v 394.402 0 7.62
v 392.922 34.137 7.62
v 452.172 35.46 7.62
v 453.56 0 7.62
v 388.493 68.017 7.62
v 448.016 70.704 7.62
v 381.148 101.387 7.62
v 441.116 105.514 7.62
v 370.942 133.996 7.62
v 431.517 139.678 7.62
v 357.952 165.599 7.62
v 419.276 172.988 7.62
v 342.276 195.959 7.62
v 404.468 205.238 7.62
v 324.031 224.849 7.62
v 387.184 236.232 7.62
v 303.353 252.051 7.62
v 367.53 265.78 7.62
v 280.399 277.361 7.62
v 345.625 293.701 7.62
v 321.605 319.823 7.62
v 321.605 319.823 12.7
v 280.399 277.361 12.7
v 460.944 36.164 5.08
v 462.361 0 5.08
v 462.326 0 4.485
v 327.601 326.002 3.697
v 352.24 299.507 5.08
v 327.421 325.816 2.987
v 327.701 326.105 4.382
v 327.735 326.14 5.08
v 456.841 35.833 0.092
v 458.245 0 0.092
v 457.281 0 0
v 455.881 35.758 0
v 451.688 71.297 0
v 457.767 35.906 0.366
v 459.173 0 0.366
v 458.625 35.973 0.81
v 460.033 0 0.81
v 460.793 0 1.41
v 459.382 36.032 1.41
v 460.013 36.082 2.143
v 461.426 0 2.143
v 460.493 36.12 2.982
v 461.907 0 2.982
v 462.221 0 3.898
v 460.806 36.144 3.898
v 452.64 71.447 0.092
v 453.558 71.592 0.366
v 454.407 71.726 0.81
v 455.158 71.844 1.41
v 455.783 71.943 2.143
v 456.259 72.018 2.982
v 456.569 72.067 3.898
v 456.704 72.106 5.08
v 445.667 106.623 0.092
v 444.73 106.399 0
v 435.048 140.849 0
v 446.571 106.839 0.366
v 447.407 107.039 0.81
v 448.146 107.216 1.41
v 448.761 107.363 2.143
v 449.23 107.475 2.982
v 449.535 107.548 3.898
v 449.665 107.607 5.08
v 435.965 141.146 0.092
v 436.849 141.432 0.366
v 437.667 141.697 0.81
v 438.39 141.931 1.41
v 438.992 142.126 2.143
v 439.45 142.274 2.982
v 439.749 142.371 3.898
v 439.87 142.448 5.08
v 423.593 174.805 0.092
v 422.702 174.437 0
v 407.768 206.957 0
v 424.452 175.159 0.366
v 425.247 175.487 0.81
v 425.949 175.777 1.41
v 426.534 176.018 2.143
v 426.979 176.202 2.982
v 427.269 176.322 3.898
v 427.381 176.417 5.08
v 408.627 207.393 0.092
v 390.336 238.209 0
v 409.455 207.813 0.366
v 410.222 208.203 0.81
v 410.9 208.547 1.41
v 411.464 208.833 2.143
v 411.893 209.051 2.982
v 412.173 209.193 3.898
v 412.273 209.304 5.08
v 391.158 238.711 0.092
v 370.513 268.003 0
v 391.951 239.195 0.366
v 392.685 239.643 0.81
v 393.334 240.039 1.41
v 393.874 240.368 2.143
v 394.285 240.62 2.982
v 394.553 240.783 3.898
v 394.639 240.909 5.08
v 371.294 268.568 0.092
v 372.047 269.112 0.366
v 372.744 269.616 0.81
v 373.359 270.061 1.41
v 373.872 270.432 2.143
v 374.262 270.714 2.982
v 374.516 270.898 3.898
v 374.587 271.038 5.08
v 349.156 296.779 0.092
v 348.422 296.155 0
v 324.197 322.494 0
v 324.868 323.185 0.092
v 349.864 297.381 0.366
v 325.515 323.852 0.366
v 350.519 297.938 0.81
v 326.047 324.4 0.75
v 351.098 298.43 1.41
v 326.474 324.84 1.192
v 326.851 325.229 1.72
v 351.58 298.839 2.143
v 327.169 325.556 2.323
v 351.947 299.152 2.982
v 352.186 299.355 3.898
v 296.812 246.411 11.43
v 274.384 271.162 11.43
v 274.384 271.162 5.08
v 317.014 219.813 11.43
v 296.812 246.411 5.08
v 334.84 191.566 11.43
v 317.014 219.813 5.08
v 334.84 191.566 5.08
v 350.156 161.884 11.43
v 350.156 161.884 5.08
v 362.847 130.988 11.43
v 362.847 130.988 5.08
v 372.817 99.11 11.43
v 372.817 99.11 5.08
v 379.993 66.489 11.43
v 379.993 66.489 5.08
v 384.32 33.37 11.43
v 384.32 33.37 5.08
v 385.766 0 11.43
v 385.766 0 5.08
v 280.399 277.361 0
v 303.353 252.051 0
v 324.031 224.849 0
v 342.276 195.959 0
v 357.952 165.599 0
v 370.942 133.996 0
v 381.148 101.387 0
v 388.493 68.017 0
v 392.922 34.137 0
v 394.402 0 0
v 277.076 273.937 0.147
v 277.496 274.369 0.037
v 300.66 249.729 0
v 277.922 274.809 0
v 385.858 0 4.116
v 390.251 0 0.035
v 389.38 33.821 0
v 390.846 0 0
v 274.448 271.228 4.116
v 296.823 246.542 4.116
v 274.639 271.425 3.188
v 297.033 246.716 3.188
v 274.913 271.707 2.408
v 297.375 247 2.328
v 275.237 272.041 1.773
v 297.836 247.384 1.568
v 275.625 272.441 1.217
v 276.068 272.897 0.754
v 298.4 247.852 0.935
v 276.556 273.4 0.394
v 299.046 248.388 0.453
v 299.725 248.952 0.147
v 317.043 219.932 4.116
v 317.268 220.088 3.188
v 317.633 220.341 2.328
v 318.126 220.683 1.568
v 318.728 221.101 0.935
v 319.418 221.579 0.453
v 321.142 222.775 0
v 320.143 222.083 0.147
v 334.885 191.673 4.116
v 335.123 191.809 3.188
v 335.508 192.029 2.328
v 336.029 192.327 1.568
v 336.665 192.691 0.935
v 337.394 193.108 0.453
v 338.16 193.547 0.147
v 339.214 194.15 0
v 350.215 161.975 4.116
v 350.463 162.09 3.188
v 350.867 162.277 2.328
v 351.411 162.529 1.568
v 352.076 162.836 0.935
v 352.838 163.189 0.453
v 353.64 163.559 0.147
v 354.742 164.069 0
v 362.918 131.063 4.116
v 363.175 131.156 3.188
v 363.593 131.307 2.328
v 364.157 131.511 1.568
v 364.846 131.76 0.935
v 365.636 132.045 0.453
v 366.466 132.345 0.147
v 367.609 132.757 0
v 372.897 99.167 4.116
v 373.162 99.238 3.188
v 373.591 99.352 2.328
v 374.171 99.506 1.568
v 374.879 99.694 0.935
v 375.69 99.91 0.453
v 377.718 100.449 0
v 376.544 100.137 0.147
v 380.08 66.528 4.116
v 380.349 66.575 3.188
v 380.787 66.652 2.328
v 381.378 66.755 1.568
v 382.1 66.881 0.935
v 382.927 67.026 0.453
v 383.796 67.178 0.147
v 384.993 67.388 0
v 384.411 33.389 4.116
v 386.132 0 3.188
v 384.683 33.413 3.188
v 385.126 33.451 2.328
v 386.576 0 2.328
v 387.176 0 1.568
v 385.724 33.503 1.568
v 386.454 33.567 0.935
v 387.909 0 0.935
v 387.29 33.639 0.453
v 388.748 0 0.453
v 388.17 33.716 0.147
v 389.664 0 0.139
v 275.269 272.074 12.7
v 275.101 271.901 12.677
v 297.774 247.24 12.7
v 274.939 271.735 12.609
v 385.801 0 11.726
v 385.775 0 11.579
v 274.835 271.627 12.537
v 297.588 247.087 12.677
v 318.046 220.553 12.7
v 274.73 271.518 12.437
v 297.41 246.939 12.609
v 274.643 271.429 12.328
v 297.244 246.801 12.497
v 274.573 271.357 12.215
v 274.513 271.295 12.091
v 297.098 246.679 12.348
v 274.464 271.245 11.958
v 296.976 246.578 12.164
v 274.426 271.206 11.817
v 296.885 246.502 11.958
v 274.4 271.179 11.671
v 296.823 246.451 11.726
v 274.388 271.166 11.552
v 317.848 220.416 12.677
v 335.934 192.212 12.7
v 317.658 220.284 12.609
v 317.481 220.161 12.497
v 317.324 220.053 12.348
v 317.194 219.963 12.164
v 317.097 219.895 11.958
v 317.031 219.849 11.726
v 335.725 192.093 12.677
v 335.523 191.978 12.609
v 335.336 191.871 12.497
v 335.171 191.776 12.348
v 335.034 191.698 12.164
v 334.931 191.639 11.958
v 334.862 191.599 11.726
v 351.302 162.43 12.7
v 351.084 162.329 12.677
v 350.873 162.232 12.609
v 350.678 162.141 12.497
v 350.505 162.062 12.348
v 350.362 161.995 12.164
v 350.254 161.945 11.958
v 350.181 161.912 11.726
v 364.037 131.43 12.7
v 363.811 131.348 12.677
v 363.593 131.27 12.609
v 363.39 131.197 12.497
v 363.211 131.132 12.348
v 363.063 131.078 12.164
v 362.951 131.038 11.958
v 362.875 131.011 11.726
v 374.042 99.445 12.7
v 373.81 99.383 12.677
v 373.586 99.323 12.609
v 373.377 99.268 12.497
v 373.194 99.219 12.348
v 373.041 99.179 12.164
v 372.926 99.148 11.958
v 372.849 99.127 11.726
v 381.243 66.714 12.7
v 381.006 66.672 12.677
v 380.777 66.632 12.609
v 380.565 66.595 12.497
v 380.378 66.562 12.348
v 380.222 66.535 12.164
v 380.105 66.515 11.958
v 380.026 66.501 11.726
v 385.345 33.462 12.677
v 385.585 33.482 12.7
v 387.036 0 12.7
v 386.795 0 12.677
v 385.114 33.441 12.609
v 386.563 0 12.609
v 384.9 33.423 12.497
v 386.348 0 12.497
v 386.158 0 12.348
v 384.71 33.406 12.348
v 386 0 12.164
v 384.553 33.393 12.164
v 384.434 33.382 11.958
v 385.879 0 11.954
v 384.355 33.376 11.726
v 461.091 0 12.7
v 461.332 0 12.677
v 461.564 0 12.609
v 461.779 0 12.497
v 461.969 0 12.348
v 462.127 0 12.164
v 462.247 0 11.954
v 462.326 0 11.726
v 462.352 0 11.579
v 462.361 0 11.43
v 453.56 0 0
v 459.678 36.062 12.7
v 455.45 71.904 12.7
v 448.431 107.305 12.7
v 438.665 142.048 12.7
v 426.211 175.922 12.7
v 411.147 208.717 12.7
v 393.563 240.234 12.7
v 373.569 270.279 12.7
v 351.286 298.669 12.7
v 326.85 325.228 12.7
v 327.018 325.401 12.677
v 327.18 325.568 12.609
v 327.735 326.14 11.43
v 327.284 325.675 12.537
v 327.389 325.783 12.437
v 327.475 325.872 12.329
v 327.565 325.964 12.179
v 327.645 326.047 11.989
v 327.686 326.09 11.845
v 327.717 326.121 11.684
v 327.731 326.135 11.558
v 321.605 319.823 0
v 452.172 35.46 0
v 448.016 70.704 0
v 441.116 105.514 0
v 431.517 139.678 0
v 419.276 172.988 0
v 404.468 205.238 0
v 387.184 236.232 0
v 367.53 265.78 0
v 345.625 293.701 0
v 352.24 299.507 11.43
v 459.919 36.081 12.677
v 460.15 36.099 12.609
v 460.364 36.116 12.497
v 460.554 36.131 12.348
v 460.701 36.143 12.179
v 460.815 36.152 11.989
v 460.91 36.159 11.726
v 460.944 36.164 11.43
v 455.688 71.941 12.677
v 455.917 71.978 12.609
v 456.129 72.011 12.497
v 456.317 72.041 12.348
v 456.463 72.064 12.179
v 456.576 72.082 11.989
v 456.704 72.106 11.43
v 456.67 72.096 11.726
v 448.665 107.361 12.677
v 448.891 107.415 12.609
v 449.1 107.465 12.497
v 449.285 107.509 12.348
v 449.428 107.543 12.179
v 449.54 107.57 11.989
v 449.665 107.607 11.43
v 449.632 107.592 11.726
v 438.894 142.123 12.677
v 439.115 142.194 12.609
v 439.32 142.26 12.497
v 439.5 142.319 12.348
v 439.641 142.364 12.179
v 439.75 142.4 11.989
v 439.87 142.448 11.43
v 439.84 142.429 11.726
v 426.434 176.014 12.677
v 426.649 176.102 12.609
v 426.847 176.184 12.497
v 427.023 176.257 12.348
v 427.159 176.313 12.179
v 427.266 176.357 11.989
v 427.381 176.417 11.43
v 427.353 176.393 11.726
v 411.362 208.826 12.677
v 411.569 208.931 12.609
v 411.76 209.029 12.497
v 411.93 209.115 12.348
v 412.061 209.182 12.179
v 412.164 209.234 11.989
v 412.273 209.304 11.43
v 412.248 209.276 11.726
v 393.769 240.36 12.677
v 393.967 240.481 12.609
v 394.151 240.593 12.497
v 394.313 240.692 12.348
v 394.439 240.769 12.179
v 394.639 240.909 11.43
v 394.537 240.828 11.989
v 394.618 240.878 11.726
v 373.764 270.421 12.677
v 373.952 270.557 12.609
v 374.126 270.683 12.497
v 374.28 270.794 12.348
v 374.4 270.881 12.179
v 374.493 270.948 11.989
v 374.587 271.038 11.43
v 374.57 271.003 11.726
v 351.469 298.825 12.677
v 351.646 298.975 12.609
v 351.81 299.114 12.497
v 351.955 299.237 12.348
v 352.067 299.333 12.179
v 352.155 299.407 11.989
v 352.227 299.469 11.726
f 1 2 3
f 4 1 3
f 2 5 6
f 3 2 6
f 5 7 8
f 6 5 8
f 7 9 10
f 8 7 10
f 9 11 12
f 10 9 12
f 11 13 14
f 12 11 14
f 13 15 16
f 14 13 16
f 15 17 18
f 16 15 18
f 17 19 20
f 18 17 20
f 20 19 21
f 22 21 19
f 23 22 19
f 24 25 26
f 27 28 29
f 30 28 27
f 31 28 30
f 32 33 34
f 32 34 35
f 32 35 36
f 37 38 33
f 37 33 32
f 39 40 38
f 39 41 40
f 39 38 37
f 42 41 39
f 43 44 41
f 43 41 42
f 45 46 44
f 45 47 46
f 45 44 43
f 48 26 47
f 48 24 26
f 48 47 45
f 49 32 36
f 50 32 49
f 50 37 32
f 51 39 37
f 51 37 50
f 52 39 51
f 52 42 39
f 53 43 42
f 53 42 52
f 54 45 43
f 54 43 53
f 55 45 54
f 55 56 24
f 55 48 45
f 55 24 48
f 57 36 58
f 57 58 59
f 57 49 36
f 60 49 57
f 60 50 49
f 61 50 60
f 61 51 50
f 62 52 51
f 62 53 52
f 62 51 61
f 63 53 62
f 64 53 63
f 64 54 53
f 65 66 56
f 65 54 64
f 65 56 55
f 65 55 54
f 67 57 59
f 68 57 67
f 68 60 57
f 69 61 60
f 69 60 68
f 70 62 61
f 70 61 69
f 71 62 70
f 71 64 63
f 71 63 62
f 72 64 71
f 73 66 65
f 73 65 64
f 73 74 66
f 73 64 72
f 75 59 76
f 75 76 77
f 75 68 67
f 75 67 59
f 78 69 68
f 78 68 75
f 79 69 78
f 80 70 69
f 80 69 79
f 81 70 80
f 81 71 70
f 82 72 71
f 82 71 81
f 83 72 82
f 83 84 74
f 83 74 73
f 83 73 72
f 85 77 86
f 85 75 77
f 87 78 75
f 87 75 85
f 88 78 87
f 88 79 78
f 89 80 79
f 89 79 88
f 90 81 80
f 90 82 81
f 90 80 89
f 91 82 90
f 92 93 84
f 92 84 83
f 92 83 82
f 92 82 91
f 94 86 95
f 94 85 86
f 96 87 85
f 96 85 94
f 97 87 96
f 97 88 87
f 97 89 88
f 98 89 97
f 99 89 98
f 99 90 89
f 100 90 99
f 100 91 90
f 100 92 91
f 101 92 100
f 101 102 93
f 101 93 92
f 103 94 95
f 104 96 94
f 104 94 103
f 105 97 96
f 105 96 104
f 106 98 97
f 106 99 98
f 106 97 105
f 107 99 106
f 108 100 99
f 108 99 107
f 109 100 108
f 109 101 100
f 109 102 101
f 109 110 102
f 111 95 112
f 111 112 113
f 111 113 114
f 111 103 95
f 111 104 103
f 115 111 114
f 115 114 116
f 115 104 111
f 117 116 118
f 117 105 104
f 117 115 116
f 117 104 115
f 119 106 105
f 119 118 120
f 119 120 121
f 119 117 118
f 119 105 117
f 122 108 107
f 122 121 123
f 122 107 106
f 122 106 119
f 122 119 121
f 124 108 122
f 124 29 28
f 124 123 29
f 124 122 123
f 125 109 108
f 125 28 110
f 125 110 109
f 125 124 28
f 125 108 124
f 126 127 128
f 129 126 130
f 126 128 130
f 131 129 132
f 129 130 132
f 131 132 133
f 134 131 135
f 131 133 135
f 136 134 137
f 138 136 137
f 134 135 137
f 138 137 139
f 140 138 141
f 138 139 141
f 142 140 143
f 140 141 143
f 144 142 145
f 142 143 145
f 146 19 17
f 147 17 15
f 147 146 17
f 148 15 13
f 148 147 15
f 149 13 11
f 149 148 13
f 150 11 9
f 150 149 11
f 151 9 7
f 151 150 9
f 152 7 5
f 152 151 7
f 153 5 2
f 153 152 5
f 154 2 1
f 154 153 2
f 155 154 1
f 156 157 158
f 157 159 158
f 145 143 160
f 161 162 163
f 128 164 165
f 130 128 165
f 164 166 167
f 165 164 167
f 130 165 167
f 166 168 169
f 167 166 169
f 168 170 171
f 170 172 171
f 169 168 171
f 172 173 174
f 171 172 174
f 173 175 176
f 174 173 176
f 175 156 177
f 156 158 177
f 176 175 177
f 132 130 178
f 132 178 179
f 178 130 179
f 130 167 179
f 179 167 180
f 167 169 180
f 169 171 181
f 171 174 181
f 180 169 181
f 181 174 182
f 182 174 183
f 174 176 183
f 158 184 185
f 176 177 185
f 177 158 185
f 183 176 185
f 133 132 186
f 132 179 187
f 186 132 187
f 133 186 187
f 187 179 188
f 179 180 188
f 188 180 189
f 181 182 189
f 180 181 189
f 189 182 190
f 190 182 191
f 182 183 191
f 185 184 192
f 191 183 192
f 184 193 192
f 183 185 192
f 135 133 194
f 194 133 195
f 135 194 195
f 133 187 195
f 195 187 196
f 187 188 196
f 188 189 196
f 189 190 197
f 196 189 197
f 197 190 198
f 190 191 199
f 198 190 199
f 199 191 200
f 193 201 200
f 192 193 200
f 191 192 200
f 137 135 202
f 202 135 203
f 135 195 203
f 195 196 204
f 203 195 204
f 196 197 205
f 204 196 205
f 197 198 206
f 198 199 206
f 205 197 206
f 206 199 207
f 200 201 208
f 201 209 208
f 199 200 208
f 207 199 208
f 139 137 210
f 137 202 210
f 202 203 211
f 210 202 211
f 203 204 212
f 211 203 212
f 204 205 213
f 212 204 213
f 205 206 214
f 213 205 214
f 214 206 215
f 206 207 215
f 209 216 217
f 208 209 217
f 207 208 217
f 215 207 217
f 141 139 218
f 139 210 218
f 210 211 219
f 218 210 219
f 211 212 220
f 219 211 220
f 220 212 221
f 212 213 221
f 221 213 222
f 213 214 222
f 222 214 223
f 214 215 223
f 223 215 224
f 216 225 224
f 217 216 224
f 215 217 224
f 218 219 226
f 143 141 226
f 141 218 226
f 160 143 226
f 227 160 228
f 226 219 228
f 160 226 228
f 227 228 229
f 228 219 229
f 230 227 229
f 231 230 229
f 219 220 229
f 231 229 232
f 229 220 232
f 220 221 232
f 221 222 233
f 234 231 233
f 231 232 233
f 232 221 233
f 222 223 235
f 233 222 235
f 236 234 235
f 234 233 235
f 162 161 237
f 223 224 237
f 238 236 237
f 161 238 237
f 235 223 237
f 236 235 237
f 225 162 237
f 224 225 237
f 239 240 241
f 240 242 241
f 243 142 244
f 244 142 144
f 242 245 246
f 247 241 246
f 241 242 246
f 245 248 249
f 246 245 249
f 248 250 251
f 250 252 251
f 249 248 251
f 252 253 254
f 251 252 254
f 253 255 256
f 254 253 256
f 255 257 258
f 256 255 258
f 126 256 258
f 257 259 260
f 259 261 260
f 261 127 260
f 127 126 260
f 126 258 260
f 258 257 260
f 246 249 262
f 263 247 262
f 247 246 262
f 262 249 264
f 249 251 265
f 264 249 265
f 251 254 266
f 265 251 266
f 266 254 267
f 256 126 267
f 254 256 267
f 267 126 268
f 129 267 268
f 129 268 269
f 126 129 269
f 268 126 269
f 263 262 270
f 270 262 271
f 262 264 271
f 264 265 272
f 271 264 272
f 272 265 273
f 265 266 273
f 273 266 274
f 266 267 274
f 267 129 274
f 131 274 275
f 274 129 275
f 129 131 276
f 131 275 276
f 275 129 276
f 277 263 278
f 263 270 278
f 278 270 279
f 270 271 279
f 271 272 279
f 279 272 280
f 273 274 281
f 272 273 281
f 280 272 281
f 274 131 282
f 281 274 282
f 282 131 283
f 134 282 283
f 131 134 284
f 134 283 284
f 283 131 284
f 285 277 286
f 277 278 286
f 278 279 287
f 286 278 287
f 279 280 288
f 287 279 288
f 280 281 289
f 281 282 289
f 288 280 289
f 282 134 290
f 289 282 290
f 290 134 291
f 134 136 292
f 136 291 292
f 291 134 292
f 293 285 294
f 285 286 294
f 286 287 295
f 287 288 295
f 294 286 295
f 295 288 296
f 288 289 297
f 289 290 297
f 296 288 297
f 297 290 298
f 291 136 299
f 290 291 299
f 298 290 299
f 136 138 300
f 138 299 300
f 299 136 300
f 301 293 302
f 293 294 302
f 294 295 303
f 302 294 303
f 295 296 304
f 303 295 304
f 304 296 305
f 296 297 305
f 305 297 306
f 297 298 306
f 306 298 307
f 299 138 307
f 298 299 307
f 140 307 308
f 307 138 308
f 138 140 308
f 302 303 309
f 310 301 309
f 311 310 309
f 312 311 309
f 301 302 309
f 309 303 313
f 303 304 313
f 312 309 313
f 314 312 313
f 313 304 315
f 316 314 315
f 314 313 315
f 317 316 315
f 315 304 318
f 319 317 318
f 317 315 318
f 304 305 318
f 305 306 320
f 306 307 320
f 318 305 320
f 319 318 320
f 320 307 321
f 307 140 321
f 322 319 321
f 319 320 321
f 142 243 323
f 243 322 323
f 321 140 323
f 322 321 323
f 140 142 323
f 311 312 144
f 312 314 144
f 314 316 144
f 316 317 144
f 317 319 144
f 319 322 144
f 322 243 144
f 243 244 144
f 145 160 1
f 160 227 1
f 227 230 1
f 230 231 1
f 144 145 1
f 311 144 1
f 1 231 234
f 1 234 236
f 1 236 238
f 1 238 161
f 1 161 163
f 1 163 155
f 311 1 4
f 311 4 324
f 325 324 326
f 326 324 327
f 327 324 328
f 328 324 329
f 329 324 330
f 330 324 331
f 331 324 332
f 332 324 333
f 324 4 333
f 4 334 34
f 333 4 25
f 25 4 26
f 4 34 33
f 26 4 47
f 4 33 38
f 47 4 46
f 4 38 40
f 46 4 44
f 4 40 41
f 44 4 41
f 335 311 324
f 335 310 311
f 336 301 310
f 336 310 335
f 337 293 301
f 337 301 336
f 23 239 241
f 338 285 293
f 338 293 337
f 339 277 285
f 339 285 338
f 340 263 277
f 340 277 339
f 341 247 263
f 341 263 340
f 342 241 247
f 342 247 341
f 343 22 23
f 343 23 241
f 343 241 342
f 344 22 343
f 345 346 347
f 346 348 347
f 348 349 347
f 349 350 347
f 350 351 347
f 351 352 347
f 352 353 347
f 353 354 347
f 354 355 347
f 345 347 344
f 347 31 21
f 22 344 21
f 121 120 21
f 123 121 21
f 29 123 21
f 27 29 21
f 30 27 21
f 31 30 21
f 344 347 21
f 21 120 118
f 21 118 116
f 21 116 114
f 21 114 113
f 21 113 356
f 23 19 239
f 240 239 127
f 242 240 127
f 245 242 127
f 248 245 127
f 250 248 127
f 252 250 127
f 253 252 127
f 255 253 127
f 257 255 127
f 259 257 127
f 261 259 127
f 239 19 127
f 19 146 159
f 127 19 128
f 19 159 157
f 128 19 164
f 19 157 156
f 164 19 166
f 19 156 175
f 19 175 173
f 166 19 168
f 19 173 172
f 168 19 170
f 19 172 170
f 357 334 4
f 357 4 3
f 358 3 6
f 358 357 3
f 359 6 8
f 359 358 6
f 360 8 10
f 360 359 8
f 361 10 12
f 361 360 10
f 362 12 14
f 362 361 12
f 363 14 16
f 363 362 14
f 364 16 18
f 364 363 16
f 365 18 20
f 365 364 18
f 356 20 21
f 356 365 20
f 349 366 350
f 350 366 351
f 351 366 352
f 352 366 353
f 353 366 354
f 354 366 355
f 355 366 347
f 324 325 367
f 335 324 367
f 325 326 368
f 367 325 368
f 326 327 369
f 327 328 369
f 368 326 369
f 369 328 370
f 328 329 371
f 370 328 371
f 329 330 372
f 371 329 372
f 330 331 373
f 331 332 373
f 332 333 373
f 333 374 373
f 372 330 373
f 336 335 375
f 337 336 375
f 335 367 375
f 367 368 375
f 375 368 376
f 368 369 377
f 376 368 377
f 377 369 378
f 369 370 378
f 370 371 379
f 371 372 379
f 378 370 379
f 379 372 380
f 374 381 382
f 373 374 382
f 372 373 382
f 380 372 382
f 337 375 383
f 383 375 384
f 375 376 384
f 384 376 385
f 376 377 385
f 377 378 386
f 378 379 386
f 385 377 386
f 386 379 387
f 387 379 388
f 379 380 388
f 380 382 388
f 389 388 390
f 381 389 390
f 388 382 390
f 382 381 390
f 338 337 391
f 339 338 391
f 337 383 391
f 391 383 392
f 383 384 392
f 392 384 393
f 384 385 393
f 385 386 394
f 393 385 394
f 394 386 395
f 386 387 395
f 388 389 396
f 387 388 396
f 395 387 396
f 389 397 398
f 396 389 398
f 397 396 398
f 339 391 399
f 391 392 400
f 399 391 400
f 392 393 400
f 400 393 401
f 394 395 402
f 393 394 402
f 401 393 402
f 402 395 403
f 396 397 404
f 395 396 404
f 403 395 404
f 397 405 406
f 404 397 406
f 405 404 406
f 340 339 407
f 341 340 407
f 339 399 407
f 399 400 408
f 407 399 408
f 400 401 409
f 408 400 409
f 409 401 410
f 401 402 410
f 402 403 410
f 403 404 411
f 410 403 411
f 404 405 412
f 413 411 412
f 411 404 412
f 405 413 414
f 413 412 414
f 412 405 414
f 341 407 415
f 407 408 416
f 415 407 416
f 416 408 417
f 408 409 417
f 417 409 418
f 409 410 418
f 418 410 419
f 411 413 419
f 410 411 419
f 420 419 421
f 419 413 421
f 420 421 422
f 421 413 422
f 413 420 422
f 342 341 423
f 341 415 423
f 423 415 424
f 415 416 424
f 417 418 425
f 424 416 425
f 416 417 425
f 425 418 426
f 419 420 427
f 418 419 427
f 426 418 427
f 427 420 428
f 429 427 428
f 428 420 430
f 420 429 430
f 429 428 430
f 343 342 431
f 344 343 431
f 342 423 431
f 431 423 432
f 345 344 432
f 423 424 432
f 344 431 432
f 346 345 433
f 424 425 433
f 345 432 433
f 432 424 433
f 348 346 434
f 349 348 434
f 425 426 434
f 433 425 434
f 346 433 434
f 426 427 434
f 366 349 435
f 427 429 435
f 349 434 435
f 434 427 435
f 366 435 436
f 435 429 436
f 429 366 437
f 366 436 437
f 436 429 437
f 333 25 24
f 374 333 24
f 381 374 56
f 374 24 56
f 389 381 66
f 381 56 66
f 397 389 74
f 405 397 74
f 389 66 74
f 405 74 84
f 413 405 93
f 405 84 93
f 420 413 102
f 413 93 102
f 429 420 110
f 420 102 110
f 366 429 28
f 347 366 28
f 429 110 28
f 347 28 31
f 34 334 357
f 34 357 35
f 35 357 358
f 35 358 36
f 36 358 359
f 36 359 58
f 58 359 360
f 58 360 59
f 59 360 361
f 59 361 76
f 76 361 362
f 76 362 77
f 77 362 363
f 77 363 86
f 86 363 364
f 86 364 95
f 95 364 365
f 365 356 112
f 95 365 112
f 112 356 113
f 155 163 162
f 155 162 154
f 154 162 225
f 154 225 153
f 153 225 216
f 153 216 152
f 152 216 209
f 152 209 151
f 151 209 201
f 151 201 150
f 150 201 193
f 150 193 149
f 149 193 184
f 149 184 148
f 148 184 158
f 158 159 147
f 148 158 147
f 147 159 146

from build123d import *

# Parameters (mm, degrees)
F1_DEPTH = 12.7
F2_DEPTH = 7.62
F3_R     = 5.08
F4_R     = 5.08
F5_R     = 1.27
F6_R     = 1.27


with BuildPart() as f1:
    # F0 (on Top) → F1 (new body)
    with BuildSketch(Plane.XY):
        with BuildLine():
            ThreePointArc((274.3839541464, 271.162187256), (356.8357568685, 146.5732878479), (385.7661028272, 0))
            Line((385.7661028272, 0), (394.4020265055, 0))
            ThreePointArc((394.4020265055, 0), (364.7896986096, 149.9381015618), (280.3993957424, 277.3610235395))
            Line((280.3993957424, 277.3610235395), (274.3839541464, 271.162187256))
        make_face()
        with BuildLine():
            ThreePointArc((280.3993957424, 277.3610235395), (364.7896986096, 149.9381015618), (394.4020265055, 0))
            Line((394.4020265055, 0), (453.5602591088, 0))
            ThreePointArc((453.5602591088, 0), (419.2757542113, 172.9877179841), (321.6053535703, 319.8232405529))
            Line((321.6053535703, 319.8232405529), (280.3993957424, 277.3610235395))
        make_face()
        with BuildLine():
            ThreePointArc((321.6053535703, 319.8232405529), (419.2757542113, 172.9877179841), (453.5602591088, 0))
            Line((453.5602591088, 0), (462.3607499635, 0))
            ThreePointArc((462.3607499635, 0), (427.3811495561, 176.4165981731), (327.7350659564, 326.1398314365))
            Line((327.7350659564, 326.1398314365), (321.6053535703, 319.8232405529))
        make_face()
    extrude(amount=F1_DEPTH)

    # F0 (on Top) → F2 (cut)
    with BuildSketch(Plane.XY):
        with BuildLine():
            ThreePointArc((280.3993957424, 277.3610235395), (364.7896986096, 149.9381015618), (394.4020265055, 0))
            Line((394.4020265055, 0), (453.5602591088, 0))
            ThreePointArc((453.5602591088, 0), (419.2757542113, 172.9877179841), (321.6053535703, 319.8232405529))
            Line((321.6053535703, 319.8232405529), (280.3993957424, 277.3610235395))
        make_face()
        with BuildLine():
            Line((453.5602591088, 0), (394.4020265055, 0))
            ThreePointArc((394.4020265055, 0), (-364.7896986096, -149.9381015618), (280.3993957424, 277.3610235395))
            Line((280.3993957424, 277.3610235395), (321.6053535703, 319.8232405529))
            ThreePointArc((321.6053535703, 319.8232405529), (-419.2757542113, -172.9877179841), (453.5602591088, 0))
        make_face()
    extrude(amount=F2_DEPTH, mode=Mode.SUBTRACT)

    # F3
    f3_edges = [f1.edges().sort_by_distance(p)[0] for p in [
        (427.38115, 176.416598, 0),
    ]]
    fillet(f3_edges, radius=F3_R)

    # F4
    f4_edges = [f1.edges().sort_by_distance(p)[0] for p in [
        (356.835757, 146.573288, 0),
    ]]
    fillet(f4_edges, radius=F4_R)

    # F5
    f5_edges = [f1.edges().sort_by_distance(p)[0] for p in [
        (427.38115, 176.416598, 12.7),
    ]]
    fillet(f5_edges, radius=F5_R)

    # F6
    f6_edges = [f1.edges().sort_by_distance(p)[0] for p in [
        (356.835757, 146.573288, 12.7),
    ]]
    fillet(f6_edges, radius=F6_R)


solid = f1.part
